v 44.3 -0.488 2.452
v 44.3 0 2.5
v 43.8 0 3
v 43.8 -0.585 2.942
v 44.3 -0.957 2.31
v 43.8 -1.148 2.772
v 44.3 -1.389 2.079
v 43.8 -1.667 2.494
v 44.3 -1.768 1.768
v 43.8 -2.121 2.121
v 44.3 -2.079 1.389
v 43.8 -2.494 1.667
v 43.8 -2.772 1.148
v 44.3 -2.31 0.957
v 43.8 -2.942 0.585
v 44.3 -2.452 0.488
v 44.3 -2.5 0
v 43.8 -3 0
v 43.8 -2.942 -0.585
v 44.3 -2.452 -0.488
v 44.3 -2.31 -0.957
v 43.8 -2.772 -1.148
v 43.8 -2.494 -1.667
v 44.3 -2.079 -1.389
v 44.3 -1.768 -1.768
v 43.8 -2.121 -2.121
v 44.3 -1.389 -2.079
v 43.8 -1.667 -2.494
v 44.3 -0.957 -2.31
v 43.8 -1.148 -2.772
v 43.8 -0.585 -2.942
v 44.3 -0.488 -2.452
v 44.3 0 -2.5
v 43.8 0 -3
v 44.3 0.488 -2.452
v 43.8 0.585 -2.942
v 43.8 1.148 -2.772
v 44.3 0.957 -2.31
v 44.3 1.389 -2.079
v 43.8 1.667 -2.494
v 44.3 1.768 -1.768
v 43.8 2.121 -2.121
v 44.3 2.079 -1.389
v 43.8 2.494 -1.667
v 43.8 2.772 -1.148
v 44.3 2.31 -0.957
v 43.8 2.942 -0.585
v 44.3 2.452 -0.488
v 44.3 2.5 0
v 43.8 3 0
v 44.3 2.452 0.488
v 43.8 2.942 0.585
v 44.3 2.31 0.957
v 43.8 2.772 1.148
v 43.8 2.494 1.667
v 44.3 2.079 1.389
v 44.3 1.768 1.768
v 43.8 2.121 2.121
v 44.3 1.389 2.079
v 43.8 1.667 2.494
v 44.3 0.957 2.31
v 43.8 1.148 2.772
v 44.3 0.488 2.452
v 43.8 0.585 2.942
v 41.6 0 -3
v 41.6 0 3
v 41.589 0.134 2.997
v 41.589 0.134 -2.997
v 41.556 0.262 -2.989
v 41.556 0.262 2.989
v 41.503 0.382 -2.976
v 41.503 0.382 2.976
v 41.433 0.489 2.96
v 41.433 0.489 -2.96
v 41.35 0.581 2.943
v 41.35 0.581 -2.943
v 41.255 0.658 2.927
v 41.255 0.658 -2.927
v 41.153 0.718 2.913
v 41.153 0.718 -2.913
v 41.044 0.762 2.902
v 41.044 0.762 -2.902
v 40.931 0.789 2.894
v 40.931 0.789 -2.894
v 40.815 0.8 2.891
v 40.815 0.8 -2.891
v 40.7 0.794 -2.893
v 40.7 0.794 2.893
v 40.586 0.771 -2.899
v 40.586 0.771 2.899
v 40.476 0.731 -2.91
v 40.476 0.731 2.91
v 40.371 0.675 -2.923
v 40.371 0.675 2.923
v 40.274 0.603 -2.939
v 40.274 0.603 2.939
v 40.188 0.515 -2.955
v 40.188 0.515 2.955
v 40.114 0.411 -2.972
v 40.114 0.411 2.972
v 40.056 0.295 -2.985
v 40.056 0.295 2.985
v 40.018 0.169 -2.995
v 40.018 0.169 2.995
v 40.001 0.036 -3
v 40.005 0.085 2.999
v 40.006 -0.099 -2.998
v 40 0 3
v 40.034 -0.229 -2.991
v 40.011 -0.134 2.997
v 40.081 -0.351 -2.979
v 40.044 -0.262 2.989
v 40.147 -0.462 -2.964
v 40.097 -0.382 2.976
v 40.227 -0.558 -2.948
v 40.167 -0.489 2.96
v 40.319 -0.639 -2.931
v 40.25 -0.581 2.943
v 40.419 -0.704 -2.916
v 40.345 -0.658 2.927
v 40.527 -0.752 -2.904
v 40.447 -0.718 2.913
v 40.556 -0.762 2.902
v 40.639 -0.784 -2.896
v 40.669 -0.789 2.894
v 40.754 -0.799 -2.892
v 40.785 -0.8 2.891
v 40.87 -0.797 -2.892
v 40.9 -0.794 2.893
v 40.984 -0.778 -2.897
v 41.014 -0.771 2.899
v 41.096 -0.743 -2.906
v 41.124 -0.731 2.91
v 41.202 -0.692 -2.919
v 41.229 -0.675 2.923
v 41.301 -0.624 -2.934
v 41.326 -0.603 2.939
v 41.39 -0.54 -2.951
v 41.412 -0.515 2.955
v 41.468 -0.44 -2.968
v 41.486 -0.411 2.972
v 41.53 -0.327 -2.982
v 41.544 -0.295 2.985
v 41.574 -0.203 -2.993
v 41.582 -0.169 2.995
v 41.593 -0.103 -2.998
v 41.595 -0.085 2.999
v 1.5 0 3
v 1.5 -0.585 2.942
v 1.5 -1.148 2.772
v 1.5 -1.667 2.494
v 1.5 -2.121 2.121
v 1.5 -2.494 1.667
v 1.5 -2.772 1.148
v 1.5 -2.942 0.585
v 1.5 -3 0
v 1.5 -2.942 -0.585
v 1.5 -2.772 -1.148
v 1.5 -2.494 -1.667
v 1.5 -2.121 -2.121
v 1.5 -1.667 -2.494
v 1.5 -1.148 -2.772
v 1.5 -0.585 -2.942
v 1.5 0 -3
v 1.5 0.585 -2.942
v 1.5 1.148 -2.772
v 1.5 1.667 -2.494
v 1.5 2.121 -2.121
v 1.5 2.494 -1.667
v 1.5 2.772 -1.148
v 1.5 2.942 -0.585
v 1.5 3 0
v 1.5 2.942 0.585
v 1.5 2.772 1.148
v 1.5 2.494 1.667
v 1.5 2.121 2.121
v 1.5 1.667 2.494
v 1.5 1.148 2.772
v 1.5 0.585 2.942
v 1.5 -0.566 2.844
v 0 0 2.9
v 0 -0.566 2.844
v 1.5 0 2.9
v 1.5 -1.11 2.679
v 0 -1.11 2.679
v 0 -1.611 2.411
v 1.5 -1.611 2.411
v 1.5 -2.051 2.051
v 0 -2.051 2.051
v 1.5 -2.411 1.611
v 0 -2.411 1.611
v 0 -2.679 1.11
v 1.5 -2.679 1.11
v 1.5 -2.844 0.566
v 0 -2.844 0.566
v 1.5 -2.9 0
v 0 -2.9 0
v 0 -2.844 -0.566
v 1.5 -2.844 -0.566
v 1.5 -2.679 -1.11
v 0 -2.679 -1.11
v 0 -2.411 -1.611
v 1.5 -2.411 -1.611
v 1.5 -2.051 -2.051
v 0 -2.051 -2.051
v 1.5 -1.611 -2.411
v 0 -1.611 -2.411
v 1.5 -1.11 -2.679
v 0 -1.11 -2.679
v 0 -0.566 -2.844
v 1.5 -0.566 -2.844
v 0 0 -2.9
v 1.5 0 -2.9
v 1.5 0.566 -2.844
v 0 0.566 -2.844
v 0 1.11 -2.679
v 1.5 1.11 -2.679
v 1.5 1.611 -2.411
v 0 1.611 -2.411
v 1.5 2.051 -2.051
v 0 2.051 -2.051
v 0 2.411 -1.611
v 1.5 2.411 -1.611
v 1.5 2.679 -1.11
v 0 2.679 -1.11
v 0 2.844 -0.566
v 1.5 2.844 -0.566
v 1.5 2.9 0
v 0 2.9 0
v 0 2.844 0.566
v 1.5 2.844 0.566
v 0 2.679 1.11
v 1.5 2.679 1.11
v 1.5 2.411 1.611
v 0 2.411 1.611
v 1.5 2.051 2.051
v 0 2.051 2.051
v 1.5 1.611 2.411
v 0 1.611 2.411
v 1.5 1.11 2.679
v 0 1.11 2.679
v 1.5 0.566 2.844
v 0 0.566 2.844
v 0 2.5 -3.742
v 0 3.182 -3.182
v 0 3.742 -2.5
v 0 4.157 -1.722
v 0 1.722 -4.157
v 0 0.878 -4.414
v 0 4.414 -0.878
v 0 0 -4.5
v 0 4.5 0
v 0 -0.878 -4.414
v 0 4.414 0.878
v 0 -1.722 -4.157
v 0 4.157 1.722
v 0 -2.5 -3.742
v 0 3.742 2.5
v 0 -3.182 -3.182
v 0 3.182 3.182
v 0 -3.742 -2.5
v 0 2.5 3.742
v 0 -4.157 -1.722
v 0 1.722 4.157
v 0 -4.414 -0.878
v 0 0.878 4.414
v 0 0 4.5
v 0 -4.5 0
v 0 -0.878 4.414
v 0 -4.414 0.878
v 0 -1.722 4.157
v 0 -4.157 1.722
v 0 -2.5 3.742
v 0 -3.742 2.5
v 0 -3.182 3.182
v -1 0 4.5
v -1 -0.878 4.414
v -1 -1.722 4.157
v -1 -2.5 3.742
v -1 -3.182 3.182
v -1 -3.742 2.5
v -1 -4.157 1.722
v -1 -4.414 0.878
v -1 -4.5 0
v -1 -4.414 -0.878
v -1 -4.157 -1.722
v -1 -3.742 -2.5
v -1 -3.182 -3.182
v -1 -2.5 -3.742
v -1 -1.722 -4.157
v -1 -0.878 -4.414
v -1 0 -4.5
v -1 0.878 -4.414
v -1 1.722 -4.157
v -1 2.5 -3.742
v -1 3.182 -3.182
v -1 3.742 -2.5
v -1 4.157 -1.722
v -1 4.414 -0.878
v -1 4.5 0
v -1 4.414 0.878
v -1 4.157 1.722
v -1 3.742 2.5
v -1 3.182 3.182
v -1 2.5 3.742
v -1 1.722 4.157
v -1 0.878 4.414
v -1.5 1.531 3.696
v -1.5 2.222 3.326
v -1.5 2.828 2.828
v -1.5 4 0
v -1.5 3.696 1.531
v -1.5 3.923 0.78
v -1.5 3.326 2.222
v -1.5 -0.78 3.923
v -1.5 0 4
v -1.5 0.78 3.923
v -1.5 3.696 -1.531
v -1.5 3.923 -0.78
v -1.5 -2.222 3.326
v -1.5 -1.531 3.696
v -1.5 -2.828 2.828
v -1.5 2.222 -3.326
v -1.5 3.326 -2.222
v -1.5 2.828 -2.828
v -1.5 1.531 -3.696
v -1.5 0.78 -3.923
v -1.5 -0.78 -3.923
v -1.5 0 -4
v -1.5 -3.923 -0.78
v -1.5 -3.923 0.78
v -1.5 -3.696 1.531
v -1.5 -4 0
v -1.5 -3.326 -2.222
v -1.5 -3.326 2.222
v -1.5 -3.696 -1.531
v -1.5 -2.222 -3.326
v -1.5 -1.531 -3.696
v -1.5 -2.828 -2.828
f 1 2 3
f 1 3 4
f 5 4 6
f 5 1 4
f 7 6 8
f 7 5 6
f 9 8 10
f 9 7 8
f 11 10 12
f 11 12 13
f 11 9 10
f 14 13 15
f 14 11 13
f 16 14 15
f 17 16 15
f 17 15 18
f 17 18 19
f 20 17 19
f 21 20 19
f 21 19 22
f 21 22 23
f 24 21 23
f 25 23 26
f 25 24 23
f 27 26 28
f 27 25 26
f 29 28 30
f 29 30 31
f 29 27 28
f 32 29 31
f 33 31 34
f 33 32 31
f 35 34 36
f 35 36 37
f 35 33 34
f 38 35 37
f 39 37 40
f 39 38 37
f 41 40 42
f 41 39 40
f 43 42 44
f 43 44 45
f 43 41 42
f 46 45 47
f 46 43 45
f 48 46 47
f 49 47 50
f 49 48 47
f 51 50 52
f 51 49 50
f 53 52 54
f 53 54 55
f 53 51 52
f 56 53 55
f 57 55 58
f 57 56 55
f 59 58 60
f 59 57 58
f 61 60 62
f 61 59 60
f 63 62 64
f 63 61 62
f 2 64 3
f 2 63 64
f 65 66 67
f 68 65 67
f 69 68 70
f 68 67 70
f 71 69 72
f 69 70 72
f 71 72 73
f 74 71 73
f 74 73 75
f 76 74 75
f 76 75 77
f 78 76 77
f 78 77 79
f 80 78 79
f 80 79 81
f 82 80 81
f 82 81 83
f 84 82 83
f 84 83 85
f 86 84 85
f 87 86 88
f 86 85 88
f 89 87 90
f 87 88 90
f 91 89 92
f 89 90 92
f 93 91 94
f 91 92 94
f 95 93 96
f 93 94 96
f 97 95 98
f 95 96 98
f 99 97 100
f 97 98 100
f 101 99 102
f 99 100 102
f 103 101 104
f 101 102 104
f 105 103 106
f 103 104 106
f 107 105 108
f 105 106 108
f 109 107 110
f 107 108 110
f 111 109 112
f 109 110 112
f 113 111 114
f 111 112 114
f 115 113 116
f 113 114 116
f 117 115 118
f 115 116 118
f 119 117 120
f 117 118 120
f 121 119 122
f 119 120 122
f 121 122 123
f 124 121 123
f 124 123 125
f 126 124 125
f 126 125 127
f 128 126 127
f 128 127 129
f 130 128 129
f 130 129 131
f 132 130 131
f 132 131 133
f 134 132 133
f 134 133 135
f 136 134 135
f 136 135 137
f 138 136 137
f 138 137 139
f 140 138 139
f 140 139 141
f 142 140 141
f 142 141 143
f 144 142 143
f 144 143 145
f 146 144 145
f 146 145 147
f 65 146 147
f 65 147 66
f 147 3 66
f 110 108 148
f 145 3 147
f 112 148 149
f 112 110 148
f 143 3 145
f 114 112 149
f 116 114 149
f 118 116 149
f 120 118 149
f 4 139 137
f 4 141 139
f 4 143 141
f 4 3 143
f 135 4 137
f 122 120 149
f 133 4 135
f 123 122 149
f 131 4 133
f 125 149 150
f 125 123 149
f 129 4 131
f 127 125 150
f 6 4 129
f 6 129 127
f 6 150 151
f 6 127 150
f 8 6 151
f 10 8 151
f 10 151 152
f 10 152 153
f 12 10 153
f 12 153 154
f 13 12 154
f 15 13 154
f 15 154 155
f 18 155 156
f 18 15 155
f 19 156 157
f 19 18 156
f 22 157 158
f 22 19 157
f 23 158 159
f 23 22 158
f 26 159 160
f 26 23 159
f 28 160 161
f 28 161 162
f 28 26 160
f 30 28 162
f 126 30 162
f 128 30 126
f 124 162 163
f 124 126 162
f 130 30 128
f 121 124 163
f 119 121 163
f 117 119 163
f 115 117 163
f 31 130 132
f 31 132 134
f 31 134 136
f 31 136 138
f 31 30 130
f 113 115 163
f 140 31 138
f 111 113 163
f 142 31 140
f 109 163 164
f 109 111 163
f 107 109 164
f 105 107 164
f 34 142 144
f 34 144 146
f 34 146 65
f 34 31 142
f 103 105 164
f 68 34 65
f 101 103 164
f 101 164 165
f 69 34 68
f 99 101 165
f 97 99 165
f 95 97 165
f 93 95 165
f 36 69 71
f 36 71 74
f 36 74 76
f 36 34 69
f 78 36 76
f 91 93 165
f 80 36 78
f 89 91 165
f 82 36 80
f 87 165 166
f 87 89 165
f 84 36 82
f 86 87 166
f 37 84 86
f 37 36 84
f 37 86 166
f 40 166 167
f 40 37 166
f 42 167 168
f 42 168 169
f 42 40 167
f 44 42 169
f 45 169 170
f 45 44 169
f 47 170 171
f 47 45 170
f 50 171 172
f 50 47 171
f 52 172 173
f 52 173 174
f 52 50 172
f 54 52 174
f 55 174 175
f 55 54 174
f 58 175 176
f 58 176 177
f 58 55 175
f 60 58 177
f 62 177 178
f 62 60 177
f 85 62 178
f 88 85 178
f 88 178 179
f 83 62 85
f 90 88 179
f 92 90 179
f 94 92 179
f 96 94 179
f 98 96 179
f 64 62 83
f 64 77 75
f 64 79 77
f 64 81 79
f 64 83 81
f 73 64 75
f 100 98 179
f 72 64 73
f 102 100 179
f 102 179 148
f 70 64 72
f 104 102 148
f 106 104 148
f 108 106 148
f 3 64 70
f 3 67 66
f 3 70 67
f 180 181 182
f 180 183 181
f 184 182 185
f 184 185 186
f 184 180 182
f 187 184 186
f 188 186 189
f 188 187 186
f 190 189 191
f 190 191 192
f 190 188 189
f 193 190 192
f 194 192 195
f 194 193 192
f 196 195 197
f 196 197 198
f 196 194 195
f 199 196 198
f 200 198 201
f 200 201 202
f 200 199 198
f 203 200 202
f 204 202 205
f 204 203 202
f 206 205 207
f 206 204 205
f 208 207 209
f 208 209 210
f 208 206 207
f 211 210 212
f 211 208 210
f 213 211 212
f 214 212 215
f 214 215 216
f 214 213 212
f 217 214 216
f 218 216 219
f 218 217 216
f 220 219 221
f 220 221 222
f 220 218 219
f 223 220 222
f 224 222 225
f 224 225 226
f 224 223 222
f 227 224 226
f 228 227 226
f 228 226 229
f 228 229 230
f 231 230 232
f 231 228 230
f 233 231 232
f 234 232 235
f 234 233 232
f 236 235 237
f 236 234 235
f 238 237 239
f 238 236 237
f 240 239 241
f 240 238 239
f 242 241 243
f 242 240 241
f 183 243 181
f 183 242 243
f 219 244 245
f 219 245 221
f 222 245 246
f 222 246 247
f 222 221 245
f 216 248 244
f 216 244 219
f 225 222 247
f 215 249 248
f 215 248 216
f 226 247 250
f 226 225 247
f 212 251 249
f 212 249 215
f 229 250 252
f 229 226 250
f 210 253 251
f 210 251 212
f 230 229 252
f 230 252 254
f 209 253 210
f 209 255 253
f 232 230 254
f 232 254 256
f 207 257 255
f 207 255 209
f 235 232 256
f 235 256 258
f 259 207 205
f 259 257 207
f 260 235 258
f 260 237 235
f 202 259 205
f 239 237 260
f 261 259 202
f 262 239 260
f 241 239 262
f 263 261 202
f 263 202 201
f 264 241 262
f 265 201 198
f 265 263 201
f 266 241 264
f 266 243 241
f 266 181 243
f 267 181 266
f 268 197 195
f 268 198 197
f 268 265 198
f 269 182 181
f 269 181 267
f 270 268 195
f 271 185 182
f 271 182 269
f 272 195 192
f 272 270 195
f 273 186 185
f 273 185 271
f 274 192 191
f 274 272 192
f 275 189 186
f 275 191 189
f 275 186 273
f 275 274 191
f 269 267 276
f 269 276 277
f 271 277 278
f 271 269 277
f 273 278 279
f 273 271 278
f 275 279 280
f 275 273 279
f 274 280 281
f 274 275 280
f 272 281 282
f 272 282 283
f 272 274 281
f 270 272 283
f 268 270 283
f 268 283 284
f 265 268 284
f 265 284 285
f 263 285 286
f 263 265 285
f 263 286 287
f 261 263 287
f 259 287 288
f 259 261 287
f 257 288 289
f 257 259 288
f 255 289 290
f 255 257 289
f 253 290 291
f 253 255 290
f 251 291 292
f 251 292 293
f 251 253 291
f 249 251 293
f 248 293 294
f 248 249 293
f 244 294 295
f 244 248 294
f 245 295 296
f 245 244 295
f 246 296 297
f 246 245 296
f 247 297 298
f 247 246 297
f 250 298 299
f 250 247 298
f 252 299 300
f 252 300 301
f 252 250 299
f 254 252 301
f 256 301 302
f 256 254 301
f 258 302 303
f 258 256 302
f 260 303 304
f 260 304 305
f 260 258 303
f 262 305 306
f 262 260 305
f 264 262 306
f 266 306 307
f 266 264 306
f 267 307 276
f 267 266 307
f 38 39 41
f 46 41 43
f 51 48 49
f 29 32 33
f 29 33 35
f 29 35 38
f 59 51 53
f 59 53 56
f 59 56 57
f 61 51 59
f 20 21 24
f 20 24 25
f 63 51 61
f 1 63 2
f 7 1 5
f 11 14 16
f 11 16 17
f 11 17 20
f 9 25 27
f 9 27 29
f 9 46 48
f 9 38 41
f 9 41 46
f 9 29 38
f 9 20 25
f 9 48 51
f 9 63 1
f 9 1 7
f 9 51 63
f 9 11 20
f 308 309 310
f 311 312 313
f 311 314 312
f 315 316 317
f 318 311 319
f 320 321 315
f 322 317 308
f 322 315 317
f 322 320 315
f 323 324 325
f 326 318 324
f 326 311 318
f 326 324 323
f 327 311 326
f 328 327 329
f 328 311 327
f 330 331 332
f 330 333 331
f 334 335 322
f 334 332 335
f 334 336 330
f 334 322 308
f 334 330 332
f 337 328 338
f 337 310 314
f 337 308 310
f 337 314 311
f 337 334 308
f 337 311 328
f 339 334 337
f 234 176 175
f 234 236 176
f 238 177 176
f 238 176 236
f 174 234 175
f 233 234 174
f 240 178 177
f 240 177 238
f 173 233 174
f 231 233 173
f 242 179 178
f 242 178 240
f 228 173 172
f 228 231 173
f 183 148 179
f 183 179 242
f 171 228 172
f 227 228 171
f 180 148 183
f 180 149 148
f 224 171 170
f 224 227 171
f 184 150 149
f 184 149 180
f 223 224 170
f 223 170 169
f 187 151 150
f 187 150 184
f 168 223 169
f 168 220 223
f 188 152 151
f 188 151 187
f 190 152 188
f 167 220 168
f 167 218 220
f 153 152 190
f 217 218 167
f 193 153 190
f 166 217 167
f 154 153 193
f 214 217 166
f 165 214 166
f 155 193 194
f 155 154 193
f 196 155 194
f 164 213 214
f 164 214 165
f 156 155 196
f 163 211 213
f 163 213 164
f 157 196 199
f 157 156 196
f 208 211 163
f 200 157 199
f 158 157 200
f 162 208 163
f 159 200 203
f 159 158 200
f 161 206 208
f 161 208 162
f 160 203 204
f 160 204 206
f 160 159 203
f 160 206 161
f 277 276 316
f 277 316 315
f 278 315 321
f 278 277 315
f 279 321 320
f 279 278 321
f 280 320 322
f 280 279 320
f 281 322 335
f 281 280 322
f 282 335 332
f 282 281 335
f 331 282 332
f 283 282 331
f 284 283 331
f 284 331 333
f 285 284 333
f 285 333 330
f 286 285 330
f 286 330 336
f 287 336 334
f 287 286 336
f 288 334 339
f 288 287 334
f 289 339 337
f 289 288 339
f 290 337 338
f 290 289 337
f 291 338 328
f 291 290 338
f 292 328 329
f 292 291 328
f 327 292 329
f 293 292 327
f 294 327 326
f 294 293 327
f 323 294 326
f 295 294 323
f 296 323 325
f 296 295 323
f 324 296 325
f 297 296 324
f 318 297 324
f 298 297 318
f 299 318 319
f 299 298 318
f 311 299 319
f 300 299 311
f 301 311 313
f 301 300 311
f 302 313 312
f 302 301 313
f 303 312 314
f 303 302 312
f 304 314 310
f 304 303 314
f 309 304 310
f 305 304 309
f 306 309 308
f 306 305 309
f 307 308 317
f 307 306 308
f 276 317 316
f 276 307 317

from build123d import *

# Parameters (mm, degrees)
SKETCH2_R          = 0.8
CUT_EXTRUDE1_DEPTH = 46.15517689
CHAMFER1_SIZE      = 0.5


with BuildPart() as part:
    # Sketch1 → Revolve1 (revolve)
    with BuildSketch(Plane.XY, mode=Mode.PRIVATE) as revolve1_sk:
        Polygon((-1.5, 0), (-1.5, 4.5), (0, 4.5), (0, 2.9), (1.5, 2.9), (1.5, 3), (44.3, 3), (44.3, 0), align=None)
    revolve(revolve1_sk.sketch.rotate(Axis((0, 0, 0), (1, 0, 0)), 90), axis=Axis((0, 0, 0), (1, 0, 0)))

    # Sketch2 → Cut-Extrude1 (cut, through all)
    with BuildSketch(Plane.XY.offset(3)):
        with Locations((40.8, 0)):
            Circle(SKETCH2_R)
    extrude(amount=-CUT_EXTRUDE1_DEPTH, mode=Mode.SUBTRACT)

    # Chamfer1
    chamfer1_edges = [part.edges().sort_by_distance(p)[0] for p in [
        (44.3, 0, -3),
        (-1.5, 0, -4.5),
    ]]
    chamfer(chamfer1_edges, length=CHAMFER1_SIZE)


solid = part.part
